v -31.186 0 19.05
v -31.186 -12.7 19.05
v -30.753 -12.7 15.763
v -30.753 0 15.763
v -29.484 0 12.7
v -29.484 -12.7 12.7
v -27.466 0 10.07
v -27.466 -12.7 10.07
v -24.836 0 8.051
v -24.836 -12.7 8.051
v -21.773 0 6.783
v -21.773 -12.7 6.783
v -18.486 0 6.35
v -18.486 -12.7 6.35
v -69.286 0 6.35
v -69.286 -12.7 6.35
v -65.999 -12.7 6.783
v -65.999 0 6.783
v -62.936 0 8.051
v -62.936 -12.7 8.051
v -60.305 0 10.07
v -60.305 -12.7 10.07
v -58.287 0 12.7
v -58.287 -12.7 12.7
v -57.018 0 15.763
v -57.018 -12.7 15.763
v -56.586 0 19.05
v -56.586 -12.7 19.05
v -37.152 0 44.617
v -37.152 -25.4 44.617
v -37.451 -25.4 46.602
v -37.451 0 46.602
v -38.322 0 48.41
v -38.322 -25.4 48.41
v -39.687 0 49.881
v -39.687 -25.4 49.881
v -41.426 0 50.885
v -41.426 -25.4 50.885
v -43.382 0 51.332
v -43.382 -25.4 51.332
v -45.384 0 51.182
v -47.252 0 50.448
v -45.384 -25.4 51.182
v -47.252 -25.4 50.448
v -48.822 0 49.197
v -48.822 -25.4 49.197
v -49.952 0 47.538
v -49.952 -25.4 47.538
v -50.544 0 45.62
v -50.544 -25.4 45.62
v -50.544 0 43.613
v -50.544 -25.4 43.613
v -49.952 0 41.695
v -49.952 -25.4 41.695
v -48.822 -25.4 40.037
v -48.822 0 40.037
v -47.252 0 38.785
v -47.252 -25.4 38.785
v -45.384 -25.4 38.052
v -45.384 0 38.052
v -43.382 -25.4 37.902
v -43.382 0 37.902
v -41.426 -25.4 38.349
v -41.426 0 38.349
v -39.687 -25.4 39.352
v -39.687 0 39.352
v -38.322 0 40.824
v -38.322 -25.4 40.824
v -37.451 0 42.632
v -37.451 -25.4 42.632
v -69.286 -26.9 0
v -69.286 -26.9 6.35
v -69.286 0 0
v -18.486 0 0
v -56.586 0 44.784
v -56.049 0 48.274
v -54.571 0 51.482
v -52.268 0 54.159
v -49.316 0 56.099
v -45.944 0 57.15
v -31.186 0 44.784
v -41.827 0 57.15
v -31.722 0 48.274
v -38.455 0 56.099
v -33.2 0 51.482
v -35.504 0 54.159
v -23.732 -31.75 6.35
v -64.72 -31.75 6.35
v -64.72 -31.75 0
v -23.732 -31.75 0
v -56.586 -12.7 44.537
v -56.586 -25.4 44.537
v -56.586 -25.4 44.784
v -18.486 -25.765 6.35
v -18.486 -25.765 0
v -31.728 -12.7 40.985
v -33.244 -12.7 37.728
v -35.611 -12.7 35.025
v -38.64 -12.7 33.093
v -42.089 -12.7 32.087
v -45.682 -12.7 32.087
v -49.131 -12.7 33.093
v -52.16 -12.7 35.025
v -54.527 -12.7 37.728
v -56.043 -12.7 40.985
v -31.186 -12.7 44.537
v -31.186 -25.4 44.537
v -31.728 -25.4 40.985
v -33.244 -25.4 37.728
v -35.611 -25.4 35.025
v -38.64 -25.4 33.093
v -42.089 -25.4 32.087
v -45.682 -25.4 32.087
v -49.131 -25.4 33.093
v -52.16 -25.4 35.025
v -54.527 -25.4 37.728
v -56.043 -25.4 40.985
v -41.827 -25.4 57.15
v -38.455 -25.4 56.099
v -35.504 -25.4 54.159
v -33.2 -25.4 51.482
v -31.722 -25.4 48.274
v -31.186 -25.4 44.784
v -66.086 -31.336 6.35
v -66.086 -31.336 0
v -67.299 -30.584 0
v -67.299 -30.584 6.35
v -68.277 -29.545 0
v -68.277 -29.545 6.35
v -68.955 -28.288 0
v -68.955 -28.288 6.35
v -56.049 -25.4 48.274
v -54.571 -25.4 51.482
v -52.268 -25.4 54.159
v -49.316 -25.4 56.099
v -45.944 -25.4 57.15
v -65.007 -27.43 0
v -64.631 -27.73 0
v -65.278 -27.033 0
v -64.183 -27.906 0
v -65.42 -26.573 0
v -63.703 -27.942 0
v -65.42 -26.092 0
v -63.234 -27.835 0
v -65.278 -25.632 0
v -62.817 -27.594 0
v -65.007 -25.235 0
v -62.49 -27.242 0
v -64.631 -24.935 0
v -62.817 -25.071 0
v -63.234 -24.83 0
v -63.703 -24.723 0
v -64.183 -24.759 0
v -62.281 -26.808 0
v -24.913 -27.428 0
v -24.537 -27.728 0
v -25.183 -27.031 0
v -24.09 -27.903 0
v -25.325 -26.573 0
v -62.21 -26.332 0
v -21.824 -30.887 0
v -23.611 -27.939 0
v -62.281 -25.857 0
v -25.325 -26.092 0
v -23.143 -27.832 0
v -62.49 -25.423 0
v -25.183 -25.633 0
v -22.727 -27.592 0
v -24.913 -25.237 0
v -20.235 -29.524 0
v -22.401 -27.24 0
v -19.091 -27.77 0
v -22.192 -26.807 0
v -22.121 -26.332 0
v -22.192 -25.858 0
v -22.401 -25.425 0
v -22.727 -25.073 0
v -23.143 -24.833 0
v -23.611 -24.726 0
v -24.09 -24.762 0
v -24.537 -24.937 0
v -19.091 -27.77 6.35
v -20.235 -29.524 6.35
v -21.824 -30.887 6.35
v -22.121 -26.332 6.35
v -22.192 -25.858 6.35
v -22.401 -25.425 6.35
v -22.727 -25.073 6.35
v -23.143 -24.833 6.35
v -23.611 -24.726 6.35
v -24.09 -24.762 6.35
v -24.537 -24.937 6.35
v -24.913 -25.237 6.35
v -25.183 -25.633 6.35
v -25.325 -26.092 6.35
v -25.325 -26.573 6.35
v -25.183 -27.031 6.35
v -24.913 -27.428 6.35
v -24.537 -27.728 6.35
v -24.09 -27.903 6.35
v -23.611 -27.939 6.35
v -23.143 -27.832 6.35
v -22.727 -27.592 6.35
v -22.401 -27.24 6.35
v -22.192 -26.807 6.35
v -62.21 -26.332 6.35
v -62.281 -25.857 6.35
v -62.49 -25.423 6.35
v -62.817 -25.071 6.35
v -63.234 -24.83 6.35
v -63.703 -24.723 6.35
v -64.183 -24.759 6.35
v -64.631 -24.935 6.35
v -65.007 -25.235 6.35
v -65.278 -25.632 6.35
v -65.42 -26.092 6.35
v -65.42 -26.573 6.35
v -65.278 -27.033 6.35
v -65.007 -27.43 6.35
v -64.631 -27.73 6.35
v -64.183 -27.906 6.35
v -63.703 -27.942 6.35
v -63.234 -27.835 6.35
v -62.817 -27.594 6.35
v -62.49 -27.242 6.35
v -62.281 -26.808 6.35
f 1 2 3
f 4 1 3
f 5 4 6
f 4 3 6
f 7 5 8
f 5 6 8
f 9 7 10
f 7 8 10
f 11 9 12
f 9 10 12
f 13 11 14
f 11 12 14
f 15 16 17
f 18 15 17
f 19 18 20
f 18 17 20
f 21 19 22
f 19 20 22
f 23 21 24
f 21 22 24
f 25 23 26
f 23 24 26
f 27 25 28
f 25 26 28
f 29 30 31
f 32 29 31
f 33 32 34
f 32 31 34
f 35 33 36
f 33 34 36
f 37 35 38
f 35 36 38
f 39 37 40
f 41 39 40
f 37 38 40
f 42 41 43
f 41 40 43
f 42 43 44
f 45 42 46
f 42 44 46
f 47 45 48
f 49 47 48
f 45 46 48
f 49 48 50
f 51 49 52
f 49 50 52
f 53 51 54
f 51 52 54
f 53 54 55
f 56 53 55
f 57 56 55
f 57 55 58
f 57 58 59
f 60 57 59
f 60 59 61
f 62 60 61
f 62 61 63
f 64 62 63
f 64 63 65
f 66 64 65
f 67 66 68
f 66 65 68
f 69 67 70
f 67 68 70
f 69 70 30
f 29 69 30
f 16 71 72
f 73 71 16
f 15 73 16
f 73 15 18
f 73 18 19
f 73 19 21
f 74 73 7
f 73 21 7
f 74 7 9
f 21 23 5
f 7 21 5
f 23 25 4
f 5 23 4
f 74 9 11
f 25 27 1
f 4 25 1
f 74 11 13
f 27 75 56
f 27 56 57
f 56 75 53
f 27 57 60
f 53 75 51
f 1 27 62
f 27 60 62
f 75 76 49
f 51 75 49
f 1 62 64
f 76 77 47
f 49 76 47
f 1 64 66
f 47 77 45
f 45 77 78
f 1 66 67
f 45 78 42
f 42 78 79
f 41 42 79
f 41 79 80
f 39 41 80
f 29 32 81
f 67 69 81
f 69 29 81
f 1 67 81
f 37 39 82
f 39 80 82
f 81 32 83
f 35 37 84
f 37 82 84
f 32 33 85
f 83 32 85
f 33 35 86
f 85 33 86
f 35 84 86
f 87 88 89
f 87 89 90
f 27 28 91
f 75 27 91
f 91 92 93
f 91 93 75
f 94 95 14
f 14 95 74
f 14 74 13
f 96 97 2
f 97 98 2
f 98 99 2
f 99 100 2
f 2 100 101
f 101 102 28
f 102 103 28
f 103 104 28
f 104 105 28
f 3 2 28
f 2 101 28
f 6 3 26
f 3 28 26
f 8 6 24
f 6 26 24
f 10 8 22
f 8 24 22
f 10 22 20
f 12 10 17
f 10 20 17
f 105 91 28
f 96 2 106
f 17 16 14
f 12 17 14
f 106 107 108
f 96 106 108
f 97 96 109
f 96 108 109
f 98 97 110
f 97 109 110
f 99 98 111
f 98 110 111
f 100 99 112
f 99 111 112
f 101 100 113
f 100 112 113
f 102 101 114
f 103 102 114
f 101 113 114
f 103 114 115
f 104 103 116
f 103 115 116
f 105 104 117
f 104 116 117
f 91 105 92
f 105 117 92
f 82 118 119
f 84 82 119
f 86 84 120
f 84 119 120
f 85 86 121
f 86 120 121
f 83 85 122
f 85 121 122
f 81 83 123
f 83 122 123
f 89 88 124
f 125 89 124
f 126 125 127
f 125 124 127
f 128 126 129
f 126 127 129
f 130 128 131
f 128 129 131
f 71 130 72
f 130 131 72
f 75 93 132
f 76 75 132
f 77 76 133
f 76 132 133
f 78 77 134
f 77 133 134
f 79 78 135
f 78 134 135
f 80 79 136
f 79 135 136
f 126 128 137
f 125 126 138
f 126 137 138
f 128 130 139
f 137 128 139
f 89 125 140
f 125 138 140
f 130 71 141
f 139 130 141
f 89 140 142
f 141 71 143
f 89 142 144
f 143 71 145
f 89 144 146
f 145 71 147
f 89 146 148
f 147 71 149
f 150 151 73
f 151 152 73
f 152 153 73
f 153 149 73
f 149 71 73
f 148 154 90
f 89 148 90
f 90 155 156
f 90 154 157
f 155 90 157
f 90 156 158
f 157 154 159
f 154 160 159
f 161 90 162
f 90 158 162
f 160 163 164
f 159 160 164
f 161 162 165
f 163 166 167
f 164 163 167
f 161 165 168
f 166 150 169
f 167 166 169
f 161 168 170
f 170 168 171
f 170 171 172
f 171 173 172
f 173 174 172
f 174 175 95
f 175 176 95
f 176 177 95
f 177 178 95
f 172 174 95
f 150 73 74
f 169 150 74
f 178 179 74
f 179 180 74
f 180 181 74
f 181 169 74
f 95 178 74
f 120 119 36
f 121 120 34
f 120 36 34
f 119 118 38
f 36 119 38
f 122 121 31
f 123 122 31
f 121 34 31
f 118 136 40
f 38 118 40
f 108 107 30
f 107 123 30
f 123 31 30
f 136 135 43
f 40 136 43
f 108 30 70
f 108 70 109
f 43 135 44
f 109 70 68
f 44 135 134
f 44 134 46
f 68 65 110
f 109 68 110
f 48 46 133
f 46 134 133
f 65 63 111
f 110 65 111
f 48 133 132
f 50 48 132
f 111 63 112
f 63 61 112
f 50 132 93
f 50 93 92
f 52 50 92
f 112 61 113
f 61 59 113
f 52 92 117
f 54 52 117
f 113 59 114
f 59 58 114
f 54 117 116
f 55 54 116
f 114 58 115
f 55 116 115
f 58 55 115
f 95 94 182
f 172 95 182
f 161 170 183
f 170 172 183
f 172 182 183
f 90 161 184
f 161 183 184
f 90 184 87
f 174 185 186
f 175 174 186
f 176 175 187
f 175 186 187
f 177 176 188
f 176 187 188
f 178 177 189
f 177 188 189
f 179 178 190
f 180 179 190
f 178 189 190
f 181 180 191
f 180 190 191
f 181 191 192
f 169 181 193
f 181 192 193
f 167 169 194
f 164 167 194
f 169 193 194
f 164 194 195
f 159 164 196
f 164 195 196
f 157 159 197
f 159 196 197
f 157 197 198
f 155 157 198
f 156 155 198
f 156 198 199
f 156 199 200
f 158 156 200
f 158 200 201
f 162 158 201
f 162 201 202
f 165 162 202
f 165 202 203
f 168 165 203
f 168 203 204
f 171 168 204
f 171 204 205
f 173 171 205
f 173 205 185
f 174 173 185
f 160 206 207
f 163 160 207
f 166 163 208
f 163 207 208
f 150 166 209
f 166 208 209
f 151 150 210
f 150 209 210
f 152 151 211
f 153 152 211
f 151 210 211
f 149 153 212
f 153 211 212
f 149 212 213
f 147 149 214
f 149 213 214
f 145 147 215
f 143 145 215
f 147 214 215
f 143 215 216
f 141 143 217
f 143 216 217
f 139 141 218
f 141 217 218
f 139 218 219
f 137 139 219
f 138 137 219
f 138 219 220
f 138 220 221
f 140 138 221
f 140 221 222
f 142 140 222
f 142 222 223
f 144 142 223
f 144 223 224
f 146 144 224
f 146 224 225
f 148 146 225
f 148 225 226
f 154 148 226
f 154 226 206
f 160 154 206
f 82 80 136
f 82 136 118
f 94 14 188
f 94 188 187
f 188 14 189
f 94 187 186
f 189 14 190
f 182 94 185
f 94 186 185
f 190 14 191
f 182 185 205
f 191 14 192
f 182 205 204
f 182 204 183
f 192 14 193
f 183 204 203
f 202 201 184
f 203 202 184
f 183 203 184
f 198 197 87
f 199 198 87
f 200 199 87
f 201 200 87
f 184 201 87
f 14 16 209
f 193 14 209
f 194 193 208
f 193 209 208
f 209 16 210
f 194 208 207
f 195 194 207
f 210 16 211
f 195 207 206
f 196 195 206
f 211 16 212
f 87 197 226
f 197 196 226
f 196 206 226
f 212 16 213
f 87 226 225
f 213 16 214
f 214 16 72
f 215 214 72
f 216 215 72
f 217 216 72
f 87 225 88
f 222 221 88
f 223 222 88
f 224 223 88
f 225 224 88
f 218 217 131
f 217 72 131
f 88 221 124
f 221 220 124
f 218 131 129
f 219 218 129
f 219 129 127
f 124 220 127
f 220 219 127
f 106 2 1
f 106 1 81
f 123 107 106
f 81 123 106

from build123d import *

# Parameters (mm, degrees)
F0_W      = 50.8
F0_H      = 57.15
F1_DEPTH  = 31.75
F3_DEPTH  = 50.8
F4_W      = 12.7
F4_H      = 25.4
F5_DEPTH  = 25.4
F6_W      = 12.7
F6_H      = 12.7
F7_DEPTH  = 25.4
F9_DEPTH  = 25.4
F11_DEPTH = 25.4
F13_DEPTH = 12.7
F14_R     = 6.7335002537
F15_DEPTH = 25.4
F17_DEPTH = 25.4
F18_R     = 1.6140947443
F18_R_2   = 1.6110130755
F19_DEPTH = 25.4


with BuildPart() as f1:
    # F0 (on Front) → F1 (new body)
    with BuildSketch(Plane.XZ):
        with Locations((-43.8855561577, 28.575)):
            Rectangle(F0_W, F0_H)
    extrude(amount=F1_DEPTH)

    # F2 (on face) → F3 (cut)
    with BuildSketch(Plane(origin=(-69.2855561577, 0, 0), x_dir=(0, -1, 0), z_dir=(-1, 0, 0))):
        Polygon((12.7, 6.35), (31.75, 6.35), (31.75, 57.15), (25.4, 57.15), (25.4, 31.75), (12.7, 31.75), align=None)
    extrude(amount=-F3_DEPTH, mode=Mode.SUBTRACT)

    # F4 (on face) → F5 (cut)
    with BuildSketch(Plane.XZ.offset(25.4)):
        with Locations((-24.8355561577, 44.45)):
            Rectangle(F4_W, F4_H)
        with Locations((-62.9355561577, 44.45)):
            Rectangle(F4_W, F4_H)
    extrude(amount=-F5_DEPTH, mode=Mode.SUBTRACT)

    # F6 (on face) → F7 (cut)
    with BuildSketch(Plane.XZ.offset(12.7)):
        with Locations((-62.9355561577, 25.4)):
            Rectangle(F6_W, F6_H)
        with Locations((-24.8355561577, 25.4)):
            Rectangle(F6_W, F6_H)
    extrude(amount=-F7_DEPTH, mode=Mode.SUBTRACT)

    # F8 (on face) → F9 (cut)
    with BuildSketch(Plane.XZ.offset(12.7)):
        with BuildLine():
            Line((-69.2855561577, 19.05), (-69.2855561577, 6.35))
            ThreePointArc((-69.2855561577, 6.35), (-60.3053000366, 10.0697438789), (-56.5855561577, 19.05))
            Line((-56.5855561577, 19.05), (-69.2855561577, 19.05))
        make_face()
        with BuildLine():
            ThreePointArc((-31.1855561577, 19.05), (-27.4658122788, 10.0697438789), (-18.4855561577, 6.35))
            Line((-18.4855561577, 6.35), (-18.4855561577, 19.05))
            Line((-18.4855561577, 19.05), (-31.1855561577, 19.05))
        make_face()
    extrude(amount=-F9_DEPTH, mode=Mode.SUBTRACT)

    # F10 (on face) → F11 (cut)
    with BuildSketch(Plane.XZ.offset(25.4)):
        with BuildLine():
            Line((-56.5855561577, 57.15), (-56.5855561577, 44.7837235148))
            ThreePointArc((-56.5855561577, 44.7837235148), (-53.5129172667, 52.9012905804), (-45.9442665885, 57.15))
            Line((-45.9442665885, 57.15), (-56.5855561577, 57.15))
        make_face()
        with BuildLine():
            ThreePointArc((-41.8268457269, 57.15), (-34.2581950488, 52.9012905804), (-31.1855561577, 44.7837235148))
            Line((-31.1855561577, 44.7837235148), (-31.1855561577, 57.15))
            Line((-31.1855561577, 57.15), (-41.8268457269, 57.15))
        make_face()
    extrude(amount=-F11_DEPTH, mode=Mode.SUBTRACT)

    # F12 (on face) → F13 (cut)
    with BuildSketch(Plane.XZ.offset(25.4)):
        with BuildLine():
            ThreePointArc((-31.1855561577, 44.5365372296), (-43.8855561577, 31.9595289981), (-56.5855561577, 44.5365372296))
            Line((-56.5855561577, 44.5365372296), (-56.5855561577, 31.75))
            Line((-56.5855561577, 31.75), (-31.1855561577, 31.75))
            Line((-31.1855561577, 31.75), (-31.1855561577, 44.5365372296))
        make_face()
    extrude(amount=-F13_DEPTH, mode=Mode.SUBTRACT)

    # F14 (on face) → F15 (cut)
    with BuildSketch(Plane.XZ.offset(25.4)):
        with Locations((-43.8855561577, 44.6168617574)):
            Circle(F14_R)
    extrude(amount=-F15_DEPTH, mode=Mode.SUBTRACT)

    # F16 (on face) → F17 (cut)
    with BuildSketch(Plane.XY.offset(6.35)):
        with BuildLine():
            ThreePointArc((-64.719619815, -31.75), (-67.8220929264, -30.0962429481), (-69.2855561577, -26.8995998395))
            Line((-69.2855561577, -26.8995998395), (-69.2855561577, -31.75))
            Line((-69.2855561577, -31.75), (-64.719619815, -31.75))
        make_face()
        with BuildLine():
            Line((-18.4855561577, -31.75), (-18.4855561577, -25.7653463632))
            ThreePointArc((-18.4855561577, -25.7653463632), (-20.2347846396, -29.5237639054), (-23.7318370491, -31.75))
            Line((-23.7318370491, -31.75), (-18.4855561577, -31.75))
        make_face()
    extrude(amount=-F17_DEPTH, mode=Mode.SUBTRACT)

    # F18 (on face) → F19 (cut)
    with BuildSketch(Plane.XY.offset(6.35)):
        with Locations((-63.8238352858, -26.3324731014)):
            Circle(F18_R)
        with Locations((-23.7318370491, -26.3324731014)):
            Circle(F18_R_2)
    extrude(amount=-F19_DEPTH, mode=Mode.SUBTRACT)


solid = f1.part
